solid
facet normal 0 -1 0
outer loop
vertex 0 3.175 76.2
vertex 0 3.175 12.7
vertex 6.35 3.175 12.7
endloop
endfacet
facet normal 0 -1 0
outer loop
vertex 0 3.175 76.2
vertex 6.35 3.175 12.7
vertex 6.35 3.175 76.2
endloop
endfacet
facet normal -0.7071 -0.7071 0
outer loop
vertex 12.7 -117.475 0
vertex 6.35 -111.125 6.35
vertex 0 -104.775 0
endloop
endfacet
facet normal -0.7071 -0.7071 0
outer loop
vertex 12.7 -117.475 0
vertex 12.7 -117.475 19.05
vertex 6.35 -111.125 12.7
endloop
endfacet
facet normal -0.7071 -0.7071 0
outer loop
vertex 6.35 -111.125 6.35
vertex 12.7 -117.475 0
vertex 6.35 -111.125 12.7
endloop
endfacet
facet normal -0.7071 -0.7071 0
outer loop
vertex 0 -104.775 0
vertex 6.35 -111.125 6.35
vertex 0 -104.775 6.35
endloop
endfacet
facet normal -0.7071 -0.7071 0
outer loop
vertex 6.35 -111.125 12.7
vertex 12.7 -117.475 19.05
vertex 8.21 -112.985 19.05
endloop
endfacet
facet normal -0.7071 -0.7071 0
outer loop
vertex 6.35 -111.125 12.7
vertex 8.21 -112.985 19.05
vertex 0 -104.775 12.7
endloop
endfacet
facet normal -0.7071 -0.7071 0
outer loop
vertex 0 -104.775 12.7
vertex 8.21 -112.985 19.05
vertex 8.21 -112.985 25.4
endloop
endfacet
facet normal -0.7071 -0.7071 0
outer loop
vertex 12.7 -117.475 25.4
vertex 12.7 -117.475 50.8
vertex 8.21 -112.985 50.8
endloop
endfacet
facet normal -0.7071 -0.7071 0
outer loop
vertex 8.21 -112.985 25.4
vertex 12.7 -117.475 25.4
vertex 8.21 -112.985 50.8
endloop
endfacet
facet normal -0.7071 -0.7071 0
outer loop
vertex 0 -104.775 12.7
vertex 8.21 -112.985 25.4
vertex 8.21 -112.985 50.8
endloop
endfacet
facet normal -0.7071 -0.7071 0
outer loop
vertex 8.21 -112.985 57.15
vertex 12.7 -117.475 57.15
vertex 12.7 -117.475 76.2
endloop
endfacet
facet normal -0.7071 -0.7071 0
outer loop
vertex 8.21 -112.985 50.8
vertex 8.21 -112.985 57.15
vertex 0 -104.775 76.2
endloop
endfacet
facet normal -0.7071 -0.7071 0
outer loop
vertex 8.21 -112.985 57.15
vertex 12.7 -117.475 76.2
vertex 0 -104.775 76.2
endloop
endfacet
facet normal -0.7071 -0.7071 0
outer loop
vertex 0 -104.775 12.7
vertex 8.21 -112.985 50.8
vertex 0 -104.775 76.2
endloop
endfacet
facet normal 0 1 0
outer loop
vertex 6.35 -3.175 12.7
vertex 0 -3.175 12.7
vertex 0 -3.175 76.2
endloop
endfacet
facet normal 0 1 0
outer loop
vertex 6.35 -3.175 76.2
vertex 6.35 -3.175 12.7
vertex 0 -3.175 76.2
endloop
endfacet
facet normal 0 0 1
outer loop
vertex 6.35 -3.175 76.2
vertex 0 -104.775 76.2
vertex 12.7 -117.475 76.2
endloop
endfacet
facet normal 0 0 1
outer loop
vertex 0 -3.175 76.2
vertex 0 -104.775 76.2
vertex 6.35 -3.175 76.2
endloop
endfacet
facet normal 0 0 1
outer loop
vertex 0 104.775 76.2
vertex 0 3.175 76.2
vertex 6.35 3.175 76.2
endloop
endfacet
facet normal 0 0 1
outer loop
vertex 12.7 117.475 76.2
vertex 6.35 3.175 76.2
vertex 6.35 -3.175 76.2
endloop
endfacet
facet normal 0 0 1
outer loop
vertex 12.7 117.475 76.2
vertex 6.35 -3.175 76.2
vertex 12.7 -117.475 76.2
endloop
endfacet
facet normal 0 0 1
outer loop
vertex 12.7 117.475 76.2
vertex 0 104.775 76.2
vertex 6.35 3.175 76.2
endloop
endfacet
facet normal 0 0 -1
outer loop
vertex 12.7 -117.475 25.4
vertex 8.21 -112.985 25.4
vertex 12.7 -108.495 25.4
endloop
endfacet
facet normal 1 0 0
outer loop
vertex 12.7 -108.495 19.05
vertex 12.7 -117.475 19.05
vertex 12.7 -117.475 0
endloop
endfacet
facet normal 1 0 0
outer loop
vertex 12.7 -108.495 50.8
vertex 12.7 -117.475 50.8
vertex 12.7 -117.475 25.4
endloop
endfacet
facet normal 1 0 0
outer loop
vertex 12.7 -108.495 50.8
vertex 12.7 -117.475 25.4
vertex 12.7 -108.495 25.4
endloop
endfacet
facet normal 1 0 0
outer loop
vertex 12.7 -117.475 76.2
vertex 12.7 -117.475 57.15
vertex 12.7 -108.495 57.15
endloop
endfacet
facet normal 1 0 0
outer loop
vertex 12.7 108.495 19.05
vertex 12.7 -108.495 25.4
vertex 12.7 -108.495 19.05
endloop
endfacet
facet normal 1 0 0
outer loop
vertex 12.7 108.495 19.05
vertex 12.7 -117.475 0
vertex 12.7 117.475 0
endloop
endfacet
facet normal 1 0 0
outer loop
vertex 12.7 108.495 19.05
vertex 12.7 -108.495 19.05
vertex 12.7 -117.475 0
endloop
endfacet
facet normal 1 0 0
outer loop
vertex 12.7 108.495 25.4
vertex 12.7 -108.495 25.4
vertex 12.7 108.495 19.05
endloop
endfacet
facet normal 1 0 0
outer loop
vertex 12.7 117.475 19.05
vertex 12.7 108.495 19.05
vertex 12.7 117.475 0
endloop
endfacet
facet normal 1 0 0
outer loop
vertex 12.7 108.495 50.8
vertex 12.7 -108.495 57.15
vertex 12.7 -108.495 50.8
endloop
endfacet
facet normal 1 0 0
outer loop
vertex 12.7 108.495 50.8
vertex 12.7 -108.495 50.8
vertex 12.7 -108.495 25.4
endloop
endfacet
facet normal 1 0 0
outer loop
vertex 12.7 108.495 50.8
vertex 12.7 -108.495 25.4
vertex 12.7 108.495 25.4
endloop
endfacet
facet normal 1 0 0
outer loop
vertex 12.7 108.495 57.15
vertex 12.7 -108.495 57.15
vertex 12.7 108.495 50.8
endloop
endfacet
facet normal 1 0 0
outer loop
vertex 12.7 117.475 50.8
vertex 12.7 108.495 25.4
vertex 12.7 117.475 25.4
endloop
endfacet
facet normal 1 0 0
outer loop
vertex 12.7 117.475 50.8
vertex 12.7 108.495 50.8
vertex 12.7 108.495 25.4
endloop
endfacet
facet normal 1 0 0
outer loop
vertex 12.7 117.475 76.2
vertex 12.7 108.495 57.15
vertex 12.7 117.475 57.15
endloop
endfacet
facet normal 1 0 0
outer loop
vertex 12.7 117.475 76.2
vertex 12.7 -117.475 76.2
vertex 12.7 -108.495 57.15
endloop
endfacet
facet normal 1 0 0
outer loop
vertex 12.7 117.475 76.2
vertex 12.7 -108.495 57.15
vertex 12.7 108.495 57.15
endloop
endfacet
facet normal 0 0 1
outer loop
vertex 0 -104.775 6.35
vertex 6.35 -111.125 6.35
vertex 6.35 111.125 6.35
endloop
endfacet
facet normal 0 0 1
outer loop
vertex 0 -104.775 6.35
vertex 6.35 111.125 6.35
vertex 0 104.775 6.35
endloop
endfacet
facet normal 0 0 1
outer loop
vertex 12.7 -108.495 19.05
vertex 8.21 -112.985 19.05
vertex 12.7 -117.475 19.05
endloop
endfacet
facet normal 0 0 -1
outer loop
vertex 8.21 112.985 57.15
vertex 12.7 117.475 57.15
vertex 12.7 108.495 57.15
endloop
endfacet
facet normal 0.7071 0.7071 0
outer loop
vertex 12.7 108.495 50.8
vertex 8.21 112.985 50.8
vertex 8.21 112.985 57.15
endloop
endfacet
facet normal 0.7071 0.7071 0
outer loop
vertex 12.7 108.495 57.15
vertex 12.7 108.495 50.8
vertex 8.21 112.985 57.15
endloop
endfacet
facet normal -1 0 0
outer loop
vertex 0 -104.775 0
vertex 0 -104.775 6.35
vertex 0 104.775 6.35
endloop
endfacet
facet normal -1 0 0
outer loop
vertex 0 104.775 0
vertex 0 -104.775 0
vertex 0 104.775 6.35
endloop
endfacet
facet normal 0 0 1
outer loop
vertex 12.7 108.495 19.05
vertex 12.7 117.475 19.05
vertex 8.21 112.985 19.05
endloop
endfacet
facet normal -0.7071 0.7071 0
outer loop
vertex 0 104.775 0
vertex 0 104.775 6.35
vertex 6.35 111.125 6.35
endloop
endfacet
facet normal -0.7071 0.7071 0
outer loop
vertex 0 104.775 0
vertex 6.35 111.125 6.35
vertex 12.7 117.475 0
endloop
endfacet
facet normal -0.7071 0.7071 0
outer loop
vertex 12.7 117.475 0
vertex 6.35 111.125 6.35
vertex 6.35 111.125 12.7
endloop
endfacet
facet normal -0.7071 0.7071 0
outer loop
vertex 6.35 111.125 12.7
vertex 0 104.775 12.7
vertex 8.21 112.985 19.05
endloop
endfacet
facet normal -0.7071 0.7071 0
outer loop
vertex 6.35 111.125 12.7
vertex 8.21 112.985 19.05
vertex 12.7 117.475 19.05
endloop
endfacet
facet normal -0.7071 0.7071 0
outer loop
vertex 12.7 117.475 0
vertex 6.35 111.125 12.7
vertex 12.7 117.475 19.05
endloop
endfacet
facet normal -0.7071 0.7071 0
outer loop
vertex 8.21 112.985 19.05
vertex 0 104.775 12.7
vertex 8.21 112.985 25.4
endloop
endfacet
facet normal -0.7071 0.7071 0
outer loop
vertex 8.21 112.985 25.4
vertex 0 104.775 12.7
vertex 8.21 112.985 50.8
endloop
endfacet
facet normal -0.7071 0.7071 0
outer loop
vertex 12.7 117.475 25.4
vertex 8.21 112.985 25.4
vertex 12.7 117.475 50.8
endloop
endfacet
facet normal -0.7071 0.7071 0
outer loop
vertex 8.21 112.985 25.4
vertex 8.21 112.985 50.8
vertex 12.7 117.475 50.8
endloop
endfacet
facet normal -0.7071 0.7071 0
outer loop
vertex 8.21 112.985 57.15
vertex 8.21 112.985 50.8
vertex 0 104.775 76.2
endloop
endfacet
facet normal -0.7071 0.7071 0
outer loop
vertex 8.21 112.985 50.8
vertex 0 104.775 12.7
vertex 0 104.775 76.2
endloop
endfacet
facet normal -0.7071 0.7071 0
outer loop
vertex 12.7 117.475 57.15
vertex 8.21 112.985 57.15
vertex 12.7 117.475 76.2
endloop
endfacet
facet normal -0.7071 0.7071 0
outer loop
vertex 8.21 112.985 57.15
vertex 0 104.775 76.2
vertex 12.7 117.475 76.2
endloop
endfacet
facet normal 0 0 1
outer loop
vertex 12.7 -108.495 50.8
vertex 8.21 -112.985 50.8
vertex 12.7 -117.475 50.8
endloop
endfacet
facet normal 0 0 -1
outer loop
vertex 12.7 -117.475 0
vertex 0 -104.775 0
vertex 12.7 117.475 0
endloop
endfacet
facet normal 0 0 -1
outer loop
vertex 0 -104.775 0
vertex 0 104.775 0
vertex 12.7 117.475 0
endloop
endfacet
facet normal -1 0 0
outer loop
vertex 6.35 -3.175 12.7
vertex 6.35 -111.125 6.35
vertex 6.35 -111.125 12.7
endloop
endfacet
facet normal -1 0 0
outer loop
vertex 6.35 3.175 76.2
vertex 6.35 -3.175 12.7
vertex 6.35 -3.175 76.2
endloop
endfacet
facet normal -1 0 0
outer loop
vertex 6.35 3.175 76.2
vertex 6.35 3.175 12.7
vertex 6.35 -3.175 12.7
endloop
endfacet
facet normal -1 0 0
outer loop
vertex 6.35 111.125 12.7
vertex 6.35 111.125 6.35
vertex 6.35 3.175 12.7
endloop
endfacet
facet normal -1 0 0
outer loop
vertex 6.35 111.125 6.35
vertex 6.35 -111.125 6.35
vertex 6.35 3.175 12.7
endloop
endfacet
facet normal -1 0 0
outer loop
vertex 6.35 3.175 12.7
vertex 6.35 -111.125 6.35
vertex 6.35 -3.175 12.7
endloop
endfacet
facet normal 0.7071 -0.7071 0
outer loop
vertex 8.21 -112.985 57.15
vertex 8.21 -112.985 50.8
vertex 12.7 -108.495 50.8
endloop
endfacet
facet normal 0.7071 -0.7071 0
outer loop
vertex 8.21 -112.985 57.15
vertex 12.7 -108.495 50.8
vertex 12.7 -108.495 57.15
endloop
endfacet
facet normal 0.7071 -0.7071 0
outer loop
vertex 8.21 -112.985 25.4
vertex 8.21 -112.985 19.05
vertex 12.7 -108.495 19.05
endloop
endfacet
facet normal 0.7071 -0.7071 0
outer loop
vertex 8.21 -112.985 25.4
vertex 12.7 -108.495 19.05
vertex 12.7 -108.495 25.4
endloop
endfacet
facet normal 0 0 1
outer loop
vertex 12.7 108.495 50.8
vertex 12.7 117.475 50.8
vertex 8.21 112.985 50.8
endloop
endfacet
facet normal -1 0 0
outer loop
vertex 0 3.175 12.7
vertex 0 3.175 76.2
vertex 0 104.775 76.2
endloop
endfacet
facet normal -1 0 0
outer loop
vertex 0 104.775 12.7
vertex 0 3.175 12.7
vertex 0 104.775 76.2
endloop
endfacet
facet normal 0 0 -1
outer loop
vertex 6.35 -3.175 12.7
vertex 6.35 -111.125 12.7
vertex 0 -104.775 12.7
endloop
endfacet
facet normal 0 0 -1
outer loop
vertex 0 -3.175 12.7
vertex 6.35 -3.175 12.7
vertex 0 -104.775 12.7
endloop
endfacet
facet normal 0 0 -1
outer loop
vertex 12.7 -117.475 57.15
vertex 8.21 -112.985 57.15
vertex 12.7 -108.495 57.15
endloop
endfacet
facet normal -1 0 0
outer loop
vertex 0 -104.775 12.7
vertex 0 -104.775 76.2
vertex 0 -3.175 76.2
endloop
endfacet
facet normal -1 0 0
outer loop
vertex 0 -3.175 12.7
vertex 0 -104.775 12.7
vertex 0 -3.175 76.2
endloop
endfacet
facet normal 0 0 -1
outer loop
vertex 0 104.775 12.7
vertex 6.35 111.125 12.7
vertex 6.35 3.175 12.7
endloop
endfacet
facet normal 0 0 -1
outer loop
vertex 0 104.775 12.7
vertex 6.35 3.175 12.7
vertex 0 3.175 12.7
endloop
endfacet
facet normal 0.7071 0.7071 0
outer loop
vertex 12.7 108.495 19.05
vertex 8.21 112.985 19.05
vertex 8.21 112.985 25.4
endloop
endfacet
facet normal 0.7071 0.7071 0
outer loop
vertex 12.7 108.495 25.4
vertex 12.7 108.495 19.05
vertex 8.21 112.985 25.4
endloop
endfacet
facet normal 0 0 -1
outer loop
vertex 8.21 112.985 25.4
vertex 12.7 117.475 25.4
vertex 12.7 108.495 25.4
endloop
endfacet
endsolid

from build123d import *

# Parameters (mm, degrees)
F0_W      = 234.95
F0_H      = 76.2
F1_DEPTH  = 12.7
F2_W      = 6.35
F2_H      = 6.35
F3_DEPTH  = 234.951
F5_DEPTH  = 76.201
F6_W      = 6.35
F6_H      = 63.5
F7_DEPTH  = 6.35
F8_W      = 6.35
F8_H      = 6.35
F9_DEPTH  = 166.135738
F10_W     = 6.35
F10_H     = 6.35
F11_DEPTH = 166.135738


with BuildPart() as f1:
    # F0 (on Right) → F1 (new body)
    with BuildSketch(Plane.YZ):
        with Locations((0, 38.1)):
            Rectangle(F0_W, F0_H)
    extrude(amount=F1_DEPTH)

    # F2 (on face) → F3 (cut, through all)
    with BuildSketch(Plane(origin=(0, 117.475, 0), x_dir=(-1, 0, 0), z_dir=(0, 1, 0))):
        with Locations((-3.175, 9.525)):
            Rectangle(F2_W, F2_H)
    extrude(amount=-F3_DEPTH, mode=Mode.SUBTRACT)

    # F4 (on face) → F5 (cut, through all)
    with BuildSketch(Plane.XY.offset(76.2)):
        Polygon((0, 104.775), (12.7, 117.475), (0, 117.475), align=None)
        Polygon((0, -104.775), (0, -117.475), (12.7, -117.475), align=None)
    extrude(amount=-F5_DEPTH, mode=Mode.SUBTRACT)

    # F6 (on face) → F7 (cut)
    with BuildSketch(Plane(origin=(0, 0, 0), x_dir=(0, -1, 0), z_dir=(-1, 0, 0))):
        with Locations((0, 44.45)):
            Rectangle(F6_W, F6_H)
    extrude(amount=-F7_DEPTH, mode=Mode.SUBTRACT)

    # F8 (on face) → F9 (cut, through all)
    with BuildSketch(Plane(origin=(-52.3875, -52.3875, 0), x_dir=(0.707107, -0.707107, 0), z_dir=(-0.707107, -0.707107, 0))):
        with Locations((88.872625, 53.975)):
            Rectangle(F8_W, F8_H)
        with Locations((88.872625, 22.225)):
            Rectangle(F8_W, F8_H)
    extrude(amount=-F9_DEPTH, mode=Mode.SUBTRACT)

    # F10 (on face) → F11 (cut, through all)
    with BuildSketch(Plane(origin=(-52.3875, 52.3875, 0), x_dir=(-0.707107, -0.707107, 0), z_dir=(-0.707107, 0.707107, 0))):
        with Locations((-88.872625, 53.975)):
            Rectangle(F10_W, F10_H)
        with Locations((-88.872625, 22.225)):
            Rectangle(F10_W, F10_H)
    extrude(amount=-F11_DEPTH, mode=Mode.SUBTRACT)


solid = f1.part
